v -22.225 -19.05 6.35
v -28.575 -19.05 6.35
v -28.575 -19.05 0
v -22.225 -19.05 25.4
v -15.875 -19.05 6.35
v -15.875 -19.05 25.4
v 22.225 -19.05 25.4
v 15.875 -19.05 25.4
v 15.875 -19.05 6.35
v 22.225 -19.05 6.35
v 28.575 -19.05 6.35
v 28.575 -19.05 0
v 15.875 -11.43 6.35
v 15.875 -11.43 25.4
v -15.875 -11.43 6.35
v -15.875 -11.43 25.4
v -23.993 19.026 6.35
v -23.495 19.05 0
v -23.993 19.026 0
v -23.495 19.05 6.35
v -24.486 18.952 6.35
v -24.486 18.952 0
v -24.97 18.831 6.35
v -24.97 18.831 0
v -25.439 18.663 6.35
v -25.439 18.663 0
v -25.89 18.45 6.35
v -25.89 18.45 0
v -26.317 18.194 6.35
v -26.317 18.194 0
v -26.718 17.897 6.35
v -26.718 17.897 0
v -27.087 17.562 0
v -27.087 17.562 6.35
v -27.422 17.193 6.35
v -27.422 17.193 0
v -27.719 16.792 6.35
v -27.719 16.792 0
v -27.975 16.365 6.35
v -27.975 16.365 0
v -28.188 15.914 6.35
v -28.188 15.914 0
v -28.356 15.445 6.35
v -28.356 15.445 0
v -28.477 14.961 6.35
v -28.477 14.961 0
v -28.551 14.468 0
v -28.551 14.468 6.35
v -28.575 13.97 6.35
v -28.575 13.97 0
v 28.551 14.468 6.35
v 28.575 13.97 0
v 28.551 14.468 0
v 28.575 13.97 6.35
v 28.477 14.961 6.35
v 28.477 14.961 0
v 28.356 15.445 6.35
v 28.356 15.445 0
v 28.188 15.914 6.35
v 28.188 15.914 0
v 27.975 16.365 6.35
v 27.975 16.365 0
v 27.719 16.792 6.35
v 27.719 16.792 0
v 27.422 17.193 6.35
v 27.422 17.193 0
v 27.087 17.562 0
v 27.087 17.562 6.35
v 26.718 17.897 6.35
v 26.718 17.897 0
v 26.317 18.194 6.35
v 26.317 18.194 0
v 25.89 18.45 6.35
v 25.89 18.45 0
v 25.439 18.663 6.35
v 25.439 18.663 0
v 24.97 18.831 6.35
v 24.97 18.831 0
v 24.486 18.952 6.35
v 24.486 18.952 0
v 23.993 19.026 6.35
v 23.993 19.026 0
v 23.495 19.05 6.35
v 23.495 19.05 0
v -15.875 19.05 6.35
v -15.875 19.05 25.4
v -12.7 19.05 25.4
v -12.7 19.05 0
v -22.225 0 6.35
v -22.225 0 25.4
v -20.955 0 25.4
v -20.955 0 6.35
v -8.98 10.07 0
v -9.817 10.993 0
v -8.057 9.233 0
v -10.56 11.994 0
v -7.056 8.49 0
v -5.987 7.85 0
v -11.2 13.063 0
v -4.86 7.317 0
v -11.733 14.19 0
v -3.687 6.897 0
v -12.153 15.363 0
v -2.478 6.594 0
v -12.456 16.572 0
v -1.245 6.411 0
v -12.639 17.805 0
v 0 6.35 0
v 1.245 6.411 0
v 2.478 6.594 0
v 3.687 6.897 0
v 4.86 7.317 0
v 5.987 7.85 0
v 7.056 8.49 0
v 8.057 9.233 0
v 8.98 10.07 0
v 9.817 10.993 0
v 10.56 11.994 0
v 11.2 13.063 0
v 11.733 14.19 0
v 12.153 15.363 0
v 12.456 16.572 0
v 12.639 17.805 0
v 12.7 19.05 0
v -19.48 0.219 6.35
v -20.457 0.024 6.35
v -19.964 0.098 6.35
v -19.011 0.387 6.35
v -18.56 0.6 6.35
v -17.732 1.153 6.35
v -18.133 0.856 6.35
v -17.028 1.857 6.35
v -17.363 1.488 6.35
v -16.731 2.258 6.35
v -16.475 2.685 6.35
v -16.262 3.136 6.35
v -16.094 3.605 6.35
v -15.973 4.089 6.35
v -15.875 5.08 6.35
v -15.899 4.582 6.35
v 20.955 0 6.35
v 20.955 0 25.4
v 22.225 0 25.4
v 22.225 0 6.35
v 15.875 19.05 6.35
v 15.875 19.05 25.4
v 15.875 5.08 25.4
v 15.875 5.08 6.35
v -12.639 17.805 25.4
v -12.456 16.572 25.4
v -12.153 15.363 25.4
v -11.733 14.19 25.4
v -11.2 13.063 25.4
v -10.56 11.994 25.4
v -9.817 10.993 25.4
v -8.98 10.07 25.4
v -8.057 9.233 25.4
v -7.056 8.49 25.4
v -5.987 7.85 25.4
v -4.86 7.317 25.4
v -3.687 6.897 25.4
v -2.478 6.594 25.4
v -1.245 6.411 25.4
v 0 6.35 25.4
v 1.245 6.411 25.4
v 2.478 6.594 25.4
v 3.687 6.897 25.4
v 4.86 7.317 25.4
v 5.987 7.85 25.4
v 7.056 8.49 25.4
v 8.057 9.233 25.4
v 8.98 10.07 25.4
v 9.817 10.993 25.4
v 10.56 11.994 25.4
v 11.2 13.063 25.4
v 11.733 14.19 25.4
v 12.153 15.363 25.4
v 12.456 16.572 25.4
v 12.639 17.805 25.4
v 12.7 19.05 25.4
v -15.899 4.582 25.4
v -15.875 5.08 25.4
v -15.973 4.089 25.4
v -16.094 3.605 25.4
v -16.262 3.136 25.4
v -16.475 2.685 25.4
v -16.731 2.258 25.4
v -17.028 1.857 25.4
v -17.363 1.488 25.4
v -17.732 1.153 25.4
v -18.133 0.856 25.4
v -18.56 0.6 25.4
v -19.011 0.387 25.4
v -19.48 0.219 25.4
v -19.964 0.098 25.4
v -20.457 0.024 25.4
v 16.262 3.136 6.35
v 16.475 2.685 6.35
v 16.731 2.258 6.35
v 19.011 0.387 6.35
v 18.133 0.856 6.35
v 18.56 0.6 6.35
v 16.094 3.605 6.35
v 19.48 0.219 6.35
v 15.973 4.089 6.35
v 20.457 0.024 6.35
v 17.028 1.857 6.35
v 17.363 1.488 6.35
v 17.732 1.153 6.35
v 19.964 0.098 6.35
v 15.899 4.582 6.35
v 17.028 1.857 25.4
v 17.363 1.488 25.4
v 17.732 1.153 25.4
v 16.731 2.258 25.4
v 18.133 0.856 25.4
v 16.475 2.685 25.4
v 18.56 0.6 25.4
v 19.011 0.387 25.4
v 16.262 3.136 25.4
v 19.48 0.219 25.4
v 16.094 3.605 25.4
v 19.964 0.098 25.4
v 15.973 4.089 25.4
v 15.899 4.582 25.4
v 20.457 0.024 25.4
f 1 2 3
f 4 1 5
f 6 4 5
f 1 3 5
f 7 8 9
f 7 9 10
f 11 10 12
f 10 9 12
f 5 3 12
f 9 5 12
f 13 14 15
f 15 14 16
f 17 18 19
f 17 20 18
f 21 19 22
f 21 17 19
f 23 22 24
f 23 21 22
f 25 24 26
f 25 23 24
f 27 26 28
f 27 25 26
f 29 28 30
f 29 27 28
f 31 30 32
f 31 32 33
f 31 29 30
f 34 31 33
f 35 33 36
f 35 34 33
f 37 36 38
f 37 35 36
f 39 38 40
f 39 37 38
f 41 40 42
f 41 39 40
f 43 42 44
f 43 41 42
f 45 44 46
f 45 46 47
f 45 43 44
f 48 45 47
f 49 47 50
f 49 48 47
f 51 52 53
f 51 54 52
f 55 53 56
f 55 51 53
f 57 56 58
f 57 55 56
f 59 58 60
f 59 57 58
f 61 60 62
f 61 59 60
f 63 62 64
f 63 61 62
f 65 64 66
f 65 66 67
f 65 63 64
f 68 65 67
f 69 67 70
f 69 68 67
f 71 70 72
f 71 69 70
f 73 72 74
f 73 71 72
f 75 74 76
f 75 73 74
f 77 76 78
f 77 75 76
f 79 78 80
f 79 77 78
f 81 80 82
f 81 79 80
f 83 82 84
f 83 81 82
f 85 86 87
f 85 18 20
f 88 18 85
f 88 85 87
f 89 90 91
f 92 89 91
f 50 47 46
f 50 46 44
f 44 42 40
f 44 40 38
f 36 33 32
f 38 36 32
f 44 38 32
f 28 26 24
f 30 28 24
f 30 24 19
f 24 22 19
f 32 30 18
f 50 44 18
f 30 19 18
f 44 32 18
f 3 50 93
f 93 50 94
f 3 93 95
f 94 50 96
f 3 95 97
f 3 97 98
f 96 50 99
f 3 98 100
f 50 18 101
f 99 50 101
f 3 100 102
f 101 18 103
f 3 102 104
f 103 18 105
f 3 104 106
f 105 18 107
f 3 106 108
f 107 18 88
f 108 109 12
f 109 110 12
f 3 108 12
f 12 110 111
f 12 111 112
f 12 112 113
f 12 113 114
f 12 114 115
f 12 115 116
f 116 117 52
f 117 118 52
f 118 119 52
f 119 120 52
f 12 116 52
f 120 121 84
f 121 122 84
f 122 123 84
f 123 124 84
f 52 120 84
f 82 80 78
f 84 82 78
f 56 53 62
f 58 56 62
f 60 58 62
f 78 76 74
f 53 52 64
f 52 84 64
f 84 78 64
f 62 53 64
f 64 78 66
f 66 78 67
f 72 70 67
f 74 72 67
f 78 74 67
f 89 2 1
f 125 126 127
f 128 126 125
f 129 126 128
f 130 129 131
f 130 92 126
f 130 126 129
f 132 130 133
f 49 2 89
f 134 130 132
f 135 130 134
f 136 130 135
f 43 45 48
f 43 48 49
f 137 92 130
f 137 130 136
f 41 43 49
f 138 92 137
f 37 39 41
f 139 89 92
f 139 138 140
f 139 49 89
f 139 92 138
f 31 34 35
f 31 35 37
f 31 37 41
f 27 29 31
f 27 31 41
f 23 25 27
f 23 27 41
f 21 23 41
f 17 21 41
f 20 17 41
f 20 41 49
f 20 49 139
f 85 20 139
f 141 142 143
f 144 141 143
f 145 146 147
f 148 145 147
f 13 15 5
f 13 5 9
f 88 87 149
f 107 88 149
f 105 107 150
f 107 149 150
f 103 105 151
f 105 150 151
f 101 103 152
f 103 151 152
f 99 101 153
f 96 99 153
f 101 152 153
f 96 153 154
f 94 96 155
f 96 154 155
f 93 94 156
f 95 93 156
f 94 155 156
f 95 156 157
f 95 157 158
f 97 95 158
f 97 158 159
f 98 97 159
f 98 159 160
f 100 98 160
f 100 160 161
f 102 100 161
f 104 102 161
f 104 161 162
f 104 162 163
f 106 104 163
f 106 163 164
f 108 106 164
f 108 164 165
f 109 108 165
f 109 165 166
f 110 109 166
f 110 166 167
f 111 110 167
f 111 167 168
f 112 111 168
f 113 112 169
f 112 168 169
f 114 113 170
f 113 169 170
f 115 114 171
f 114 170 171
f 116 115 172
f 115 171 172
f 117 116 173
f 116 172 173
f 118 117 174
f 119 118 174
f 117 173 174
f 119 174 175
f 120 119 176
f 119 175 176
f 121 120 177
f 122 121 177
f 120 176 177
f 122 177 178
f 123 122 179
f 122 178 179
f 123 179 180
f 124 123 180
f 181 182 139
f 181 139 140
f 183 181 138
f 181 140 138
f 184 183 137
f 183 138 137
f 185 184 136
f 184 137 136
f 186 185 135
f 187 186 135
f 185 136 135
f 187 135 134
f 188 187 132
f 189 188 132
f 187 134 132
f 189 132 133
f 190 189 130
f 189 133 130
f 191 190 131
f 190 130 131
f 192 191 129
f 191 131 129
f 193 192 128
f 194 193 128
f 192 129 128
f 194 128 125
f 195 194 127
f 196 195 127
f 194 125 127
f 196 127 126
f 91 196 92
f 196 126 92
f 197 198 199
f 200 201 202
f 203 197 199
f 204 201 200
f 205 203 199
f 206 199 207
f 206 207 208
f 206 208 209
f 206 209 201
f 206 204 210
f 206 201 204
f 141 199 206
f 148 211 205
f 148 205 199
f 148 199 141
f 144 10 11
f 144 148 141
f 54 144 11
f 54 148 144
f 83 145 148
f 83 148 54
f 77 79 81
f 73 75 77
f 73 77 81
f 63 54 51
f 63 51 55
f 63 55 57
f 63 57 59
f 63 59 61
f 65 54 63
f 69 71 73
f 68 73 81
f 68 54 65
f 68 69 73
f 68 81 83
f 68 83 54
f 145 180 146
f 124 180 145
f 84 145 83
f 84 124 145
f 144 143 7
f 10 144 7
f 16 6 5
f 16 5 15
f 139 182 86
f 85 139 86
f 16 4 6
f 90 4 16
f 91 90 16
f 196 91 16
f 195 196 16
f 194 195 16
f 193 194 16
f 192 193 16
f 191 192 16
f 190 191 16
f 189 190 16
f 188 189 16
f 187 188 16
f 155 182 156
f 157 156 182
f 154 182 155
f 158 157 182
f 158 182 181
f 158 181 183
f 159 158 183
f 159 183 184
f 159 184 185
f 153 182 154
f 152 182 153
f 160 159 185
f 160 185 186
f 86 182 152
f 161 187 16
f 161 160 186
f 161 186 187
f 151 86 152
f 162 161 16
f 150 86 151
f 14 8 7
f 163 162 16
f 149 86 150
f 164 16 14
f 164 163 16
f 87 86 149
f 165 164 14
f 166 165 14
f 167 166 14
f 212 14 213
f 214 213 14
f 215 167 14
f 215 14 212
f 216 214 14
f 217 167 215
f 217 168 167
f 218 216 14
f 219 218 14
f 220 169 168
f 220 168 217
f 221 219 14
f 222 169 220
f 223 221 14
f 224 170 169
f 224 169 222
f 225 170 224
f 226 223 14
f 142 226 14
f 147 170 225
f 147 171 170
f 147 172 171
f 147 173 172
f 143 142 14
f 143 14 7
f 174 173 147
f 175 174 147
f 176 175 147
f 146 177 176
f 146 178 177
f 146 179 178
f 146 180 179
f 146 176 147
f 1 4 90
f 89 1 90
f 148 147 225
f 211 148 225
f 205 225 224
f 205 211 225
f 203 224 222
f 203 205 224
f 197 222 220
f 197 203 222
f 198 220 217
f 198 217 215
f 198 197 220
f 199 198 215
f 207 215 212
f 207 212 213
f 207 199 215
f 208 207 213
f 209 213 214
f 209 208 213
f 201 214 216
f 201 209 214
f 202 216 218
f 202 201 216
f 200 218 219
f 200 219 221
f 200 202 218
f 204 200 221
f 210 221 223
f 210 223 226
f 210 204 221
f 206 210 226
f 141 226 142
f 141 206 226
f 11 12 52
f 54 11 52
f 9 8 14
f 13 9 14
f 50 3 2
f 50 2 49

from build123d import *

# Parameters (mm, degrees)
F0_W     = 57.15
F0_H     = 38.1
F1_DEPTH = 25.4
F2_W     = 15.875
F2_H     = 7.62
F3_DEPTH = 19.05
F4_R     = 12.7
F5_DEPTH = 25.401
F6_R     = 5.08
F7_R     = 5.08


with BuildPart() as f1:
    # F0 (on Top) → F1 (new body)
    with BuildSketch(Plane.XY):
        Rectangle(F0_W, F0_H)
    extrude(amount=F1_DEPTH)

    # F2 (on face) → F3 (cut)
    with BuildSketch(Plane.XY.offset(25.4)):
        with Locations((-7.9375, -15.24)):
            Rectangle(F2_W, F2_H)
        with Locations((7.9375, -15.24)):
            Rectangle(F2_W, F2_H)
        Polygon((-28.575, 19.05), (-28.575, -19.05), (-22.225, -19.05), (-22.225, 0), (-15.875, 0), (-15.875, 19.05), (-22.225, 19.05), align=None)
        Polygon((22.225, 19.05), (15.875, 19.05), (15.875, 0), (22.225, 0), (22.225, -19.05), (28.575, -19.05), (28.575, 19.05), align=None)
    extrude(amount=-F3_DEPTH, mode=Mode.SUBTRACT)

    # F4 (on face) → F5 (cut, through all)
    with BuildSketch(Plane.XY.offset(25.4)):
        with Locations((0, 19.05)):
            Circle(F4_R)
    extrude(amount=-F5_DEPTH, mode=Mode.SUBTRACT)

    # F6
    f6_edges = [f1.edges().sort_by_distance(p)[0] for p in [
        (-15.875, 0, 15.875),
        (15.875, 0, 15.875),
    ]]
    fillet(f6_edges, radius=F6_R)

    # F7
    f7_edges = [f1.edges().sort_by_distance(p)[0] for p in [
        (28.575, 19.05, 3.175),
        (-28.575, 19.05, 3.175),
    ]]
    fillet(f7_edges, radius=F7_R)


solid = f1.part
